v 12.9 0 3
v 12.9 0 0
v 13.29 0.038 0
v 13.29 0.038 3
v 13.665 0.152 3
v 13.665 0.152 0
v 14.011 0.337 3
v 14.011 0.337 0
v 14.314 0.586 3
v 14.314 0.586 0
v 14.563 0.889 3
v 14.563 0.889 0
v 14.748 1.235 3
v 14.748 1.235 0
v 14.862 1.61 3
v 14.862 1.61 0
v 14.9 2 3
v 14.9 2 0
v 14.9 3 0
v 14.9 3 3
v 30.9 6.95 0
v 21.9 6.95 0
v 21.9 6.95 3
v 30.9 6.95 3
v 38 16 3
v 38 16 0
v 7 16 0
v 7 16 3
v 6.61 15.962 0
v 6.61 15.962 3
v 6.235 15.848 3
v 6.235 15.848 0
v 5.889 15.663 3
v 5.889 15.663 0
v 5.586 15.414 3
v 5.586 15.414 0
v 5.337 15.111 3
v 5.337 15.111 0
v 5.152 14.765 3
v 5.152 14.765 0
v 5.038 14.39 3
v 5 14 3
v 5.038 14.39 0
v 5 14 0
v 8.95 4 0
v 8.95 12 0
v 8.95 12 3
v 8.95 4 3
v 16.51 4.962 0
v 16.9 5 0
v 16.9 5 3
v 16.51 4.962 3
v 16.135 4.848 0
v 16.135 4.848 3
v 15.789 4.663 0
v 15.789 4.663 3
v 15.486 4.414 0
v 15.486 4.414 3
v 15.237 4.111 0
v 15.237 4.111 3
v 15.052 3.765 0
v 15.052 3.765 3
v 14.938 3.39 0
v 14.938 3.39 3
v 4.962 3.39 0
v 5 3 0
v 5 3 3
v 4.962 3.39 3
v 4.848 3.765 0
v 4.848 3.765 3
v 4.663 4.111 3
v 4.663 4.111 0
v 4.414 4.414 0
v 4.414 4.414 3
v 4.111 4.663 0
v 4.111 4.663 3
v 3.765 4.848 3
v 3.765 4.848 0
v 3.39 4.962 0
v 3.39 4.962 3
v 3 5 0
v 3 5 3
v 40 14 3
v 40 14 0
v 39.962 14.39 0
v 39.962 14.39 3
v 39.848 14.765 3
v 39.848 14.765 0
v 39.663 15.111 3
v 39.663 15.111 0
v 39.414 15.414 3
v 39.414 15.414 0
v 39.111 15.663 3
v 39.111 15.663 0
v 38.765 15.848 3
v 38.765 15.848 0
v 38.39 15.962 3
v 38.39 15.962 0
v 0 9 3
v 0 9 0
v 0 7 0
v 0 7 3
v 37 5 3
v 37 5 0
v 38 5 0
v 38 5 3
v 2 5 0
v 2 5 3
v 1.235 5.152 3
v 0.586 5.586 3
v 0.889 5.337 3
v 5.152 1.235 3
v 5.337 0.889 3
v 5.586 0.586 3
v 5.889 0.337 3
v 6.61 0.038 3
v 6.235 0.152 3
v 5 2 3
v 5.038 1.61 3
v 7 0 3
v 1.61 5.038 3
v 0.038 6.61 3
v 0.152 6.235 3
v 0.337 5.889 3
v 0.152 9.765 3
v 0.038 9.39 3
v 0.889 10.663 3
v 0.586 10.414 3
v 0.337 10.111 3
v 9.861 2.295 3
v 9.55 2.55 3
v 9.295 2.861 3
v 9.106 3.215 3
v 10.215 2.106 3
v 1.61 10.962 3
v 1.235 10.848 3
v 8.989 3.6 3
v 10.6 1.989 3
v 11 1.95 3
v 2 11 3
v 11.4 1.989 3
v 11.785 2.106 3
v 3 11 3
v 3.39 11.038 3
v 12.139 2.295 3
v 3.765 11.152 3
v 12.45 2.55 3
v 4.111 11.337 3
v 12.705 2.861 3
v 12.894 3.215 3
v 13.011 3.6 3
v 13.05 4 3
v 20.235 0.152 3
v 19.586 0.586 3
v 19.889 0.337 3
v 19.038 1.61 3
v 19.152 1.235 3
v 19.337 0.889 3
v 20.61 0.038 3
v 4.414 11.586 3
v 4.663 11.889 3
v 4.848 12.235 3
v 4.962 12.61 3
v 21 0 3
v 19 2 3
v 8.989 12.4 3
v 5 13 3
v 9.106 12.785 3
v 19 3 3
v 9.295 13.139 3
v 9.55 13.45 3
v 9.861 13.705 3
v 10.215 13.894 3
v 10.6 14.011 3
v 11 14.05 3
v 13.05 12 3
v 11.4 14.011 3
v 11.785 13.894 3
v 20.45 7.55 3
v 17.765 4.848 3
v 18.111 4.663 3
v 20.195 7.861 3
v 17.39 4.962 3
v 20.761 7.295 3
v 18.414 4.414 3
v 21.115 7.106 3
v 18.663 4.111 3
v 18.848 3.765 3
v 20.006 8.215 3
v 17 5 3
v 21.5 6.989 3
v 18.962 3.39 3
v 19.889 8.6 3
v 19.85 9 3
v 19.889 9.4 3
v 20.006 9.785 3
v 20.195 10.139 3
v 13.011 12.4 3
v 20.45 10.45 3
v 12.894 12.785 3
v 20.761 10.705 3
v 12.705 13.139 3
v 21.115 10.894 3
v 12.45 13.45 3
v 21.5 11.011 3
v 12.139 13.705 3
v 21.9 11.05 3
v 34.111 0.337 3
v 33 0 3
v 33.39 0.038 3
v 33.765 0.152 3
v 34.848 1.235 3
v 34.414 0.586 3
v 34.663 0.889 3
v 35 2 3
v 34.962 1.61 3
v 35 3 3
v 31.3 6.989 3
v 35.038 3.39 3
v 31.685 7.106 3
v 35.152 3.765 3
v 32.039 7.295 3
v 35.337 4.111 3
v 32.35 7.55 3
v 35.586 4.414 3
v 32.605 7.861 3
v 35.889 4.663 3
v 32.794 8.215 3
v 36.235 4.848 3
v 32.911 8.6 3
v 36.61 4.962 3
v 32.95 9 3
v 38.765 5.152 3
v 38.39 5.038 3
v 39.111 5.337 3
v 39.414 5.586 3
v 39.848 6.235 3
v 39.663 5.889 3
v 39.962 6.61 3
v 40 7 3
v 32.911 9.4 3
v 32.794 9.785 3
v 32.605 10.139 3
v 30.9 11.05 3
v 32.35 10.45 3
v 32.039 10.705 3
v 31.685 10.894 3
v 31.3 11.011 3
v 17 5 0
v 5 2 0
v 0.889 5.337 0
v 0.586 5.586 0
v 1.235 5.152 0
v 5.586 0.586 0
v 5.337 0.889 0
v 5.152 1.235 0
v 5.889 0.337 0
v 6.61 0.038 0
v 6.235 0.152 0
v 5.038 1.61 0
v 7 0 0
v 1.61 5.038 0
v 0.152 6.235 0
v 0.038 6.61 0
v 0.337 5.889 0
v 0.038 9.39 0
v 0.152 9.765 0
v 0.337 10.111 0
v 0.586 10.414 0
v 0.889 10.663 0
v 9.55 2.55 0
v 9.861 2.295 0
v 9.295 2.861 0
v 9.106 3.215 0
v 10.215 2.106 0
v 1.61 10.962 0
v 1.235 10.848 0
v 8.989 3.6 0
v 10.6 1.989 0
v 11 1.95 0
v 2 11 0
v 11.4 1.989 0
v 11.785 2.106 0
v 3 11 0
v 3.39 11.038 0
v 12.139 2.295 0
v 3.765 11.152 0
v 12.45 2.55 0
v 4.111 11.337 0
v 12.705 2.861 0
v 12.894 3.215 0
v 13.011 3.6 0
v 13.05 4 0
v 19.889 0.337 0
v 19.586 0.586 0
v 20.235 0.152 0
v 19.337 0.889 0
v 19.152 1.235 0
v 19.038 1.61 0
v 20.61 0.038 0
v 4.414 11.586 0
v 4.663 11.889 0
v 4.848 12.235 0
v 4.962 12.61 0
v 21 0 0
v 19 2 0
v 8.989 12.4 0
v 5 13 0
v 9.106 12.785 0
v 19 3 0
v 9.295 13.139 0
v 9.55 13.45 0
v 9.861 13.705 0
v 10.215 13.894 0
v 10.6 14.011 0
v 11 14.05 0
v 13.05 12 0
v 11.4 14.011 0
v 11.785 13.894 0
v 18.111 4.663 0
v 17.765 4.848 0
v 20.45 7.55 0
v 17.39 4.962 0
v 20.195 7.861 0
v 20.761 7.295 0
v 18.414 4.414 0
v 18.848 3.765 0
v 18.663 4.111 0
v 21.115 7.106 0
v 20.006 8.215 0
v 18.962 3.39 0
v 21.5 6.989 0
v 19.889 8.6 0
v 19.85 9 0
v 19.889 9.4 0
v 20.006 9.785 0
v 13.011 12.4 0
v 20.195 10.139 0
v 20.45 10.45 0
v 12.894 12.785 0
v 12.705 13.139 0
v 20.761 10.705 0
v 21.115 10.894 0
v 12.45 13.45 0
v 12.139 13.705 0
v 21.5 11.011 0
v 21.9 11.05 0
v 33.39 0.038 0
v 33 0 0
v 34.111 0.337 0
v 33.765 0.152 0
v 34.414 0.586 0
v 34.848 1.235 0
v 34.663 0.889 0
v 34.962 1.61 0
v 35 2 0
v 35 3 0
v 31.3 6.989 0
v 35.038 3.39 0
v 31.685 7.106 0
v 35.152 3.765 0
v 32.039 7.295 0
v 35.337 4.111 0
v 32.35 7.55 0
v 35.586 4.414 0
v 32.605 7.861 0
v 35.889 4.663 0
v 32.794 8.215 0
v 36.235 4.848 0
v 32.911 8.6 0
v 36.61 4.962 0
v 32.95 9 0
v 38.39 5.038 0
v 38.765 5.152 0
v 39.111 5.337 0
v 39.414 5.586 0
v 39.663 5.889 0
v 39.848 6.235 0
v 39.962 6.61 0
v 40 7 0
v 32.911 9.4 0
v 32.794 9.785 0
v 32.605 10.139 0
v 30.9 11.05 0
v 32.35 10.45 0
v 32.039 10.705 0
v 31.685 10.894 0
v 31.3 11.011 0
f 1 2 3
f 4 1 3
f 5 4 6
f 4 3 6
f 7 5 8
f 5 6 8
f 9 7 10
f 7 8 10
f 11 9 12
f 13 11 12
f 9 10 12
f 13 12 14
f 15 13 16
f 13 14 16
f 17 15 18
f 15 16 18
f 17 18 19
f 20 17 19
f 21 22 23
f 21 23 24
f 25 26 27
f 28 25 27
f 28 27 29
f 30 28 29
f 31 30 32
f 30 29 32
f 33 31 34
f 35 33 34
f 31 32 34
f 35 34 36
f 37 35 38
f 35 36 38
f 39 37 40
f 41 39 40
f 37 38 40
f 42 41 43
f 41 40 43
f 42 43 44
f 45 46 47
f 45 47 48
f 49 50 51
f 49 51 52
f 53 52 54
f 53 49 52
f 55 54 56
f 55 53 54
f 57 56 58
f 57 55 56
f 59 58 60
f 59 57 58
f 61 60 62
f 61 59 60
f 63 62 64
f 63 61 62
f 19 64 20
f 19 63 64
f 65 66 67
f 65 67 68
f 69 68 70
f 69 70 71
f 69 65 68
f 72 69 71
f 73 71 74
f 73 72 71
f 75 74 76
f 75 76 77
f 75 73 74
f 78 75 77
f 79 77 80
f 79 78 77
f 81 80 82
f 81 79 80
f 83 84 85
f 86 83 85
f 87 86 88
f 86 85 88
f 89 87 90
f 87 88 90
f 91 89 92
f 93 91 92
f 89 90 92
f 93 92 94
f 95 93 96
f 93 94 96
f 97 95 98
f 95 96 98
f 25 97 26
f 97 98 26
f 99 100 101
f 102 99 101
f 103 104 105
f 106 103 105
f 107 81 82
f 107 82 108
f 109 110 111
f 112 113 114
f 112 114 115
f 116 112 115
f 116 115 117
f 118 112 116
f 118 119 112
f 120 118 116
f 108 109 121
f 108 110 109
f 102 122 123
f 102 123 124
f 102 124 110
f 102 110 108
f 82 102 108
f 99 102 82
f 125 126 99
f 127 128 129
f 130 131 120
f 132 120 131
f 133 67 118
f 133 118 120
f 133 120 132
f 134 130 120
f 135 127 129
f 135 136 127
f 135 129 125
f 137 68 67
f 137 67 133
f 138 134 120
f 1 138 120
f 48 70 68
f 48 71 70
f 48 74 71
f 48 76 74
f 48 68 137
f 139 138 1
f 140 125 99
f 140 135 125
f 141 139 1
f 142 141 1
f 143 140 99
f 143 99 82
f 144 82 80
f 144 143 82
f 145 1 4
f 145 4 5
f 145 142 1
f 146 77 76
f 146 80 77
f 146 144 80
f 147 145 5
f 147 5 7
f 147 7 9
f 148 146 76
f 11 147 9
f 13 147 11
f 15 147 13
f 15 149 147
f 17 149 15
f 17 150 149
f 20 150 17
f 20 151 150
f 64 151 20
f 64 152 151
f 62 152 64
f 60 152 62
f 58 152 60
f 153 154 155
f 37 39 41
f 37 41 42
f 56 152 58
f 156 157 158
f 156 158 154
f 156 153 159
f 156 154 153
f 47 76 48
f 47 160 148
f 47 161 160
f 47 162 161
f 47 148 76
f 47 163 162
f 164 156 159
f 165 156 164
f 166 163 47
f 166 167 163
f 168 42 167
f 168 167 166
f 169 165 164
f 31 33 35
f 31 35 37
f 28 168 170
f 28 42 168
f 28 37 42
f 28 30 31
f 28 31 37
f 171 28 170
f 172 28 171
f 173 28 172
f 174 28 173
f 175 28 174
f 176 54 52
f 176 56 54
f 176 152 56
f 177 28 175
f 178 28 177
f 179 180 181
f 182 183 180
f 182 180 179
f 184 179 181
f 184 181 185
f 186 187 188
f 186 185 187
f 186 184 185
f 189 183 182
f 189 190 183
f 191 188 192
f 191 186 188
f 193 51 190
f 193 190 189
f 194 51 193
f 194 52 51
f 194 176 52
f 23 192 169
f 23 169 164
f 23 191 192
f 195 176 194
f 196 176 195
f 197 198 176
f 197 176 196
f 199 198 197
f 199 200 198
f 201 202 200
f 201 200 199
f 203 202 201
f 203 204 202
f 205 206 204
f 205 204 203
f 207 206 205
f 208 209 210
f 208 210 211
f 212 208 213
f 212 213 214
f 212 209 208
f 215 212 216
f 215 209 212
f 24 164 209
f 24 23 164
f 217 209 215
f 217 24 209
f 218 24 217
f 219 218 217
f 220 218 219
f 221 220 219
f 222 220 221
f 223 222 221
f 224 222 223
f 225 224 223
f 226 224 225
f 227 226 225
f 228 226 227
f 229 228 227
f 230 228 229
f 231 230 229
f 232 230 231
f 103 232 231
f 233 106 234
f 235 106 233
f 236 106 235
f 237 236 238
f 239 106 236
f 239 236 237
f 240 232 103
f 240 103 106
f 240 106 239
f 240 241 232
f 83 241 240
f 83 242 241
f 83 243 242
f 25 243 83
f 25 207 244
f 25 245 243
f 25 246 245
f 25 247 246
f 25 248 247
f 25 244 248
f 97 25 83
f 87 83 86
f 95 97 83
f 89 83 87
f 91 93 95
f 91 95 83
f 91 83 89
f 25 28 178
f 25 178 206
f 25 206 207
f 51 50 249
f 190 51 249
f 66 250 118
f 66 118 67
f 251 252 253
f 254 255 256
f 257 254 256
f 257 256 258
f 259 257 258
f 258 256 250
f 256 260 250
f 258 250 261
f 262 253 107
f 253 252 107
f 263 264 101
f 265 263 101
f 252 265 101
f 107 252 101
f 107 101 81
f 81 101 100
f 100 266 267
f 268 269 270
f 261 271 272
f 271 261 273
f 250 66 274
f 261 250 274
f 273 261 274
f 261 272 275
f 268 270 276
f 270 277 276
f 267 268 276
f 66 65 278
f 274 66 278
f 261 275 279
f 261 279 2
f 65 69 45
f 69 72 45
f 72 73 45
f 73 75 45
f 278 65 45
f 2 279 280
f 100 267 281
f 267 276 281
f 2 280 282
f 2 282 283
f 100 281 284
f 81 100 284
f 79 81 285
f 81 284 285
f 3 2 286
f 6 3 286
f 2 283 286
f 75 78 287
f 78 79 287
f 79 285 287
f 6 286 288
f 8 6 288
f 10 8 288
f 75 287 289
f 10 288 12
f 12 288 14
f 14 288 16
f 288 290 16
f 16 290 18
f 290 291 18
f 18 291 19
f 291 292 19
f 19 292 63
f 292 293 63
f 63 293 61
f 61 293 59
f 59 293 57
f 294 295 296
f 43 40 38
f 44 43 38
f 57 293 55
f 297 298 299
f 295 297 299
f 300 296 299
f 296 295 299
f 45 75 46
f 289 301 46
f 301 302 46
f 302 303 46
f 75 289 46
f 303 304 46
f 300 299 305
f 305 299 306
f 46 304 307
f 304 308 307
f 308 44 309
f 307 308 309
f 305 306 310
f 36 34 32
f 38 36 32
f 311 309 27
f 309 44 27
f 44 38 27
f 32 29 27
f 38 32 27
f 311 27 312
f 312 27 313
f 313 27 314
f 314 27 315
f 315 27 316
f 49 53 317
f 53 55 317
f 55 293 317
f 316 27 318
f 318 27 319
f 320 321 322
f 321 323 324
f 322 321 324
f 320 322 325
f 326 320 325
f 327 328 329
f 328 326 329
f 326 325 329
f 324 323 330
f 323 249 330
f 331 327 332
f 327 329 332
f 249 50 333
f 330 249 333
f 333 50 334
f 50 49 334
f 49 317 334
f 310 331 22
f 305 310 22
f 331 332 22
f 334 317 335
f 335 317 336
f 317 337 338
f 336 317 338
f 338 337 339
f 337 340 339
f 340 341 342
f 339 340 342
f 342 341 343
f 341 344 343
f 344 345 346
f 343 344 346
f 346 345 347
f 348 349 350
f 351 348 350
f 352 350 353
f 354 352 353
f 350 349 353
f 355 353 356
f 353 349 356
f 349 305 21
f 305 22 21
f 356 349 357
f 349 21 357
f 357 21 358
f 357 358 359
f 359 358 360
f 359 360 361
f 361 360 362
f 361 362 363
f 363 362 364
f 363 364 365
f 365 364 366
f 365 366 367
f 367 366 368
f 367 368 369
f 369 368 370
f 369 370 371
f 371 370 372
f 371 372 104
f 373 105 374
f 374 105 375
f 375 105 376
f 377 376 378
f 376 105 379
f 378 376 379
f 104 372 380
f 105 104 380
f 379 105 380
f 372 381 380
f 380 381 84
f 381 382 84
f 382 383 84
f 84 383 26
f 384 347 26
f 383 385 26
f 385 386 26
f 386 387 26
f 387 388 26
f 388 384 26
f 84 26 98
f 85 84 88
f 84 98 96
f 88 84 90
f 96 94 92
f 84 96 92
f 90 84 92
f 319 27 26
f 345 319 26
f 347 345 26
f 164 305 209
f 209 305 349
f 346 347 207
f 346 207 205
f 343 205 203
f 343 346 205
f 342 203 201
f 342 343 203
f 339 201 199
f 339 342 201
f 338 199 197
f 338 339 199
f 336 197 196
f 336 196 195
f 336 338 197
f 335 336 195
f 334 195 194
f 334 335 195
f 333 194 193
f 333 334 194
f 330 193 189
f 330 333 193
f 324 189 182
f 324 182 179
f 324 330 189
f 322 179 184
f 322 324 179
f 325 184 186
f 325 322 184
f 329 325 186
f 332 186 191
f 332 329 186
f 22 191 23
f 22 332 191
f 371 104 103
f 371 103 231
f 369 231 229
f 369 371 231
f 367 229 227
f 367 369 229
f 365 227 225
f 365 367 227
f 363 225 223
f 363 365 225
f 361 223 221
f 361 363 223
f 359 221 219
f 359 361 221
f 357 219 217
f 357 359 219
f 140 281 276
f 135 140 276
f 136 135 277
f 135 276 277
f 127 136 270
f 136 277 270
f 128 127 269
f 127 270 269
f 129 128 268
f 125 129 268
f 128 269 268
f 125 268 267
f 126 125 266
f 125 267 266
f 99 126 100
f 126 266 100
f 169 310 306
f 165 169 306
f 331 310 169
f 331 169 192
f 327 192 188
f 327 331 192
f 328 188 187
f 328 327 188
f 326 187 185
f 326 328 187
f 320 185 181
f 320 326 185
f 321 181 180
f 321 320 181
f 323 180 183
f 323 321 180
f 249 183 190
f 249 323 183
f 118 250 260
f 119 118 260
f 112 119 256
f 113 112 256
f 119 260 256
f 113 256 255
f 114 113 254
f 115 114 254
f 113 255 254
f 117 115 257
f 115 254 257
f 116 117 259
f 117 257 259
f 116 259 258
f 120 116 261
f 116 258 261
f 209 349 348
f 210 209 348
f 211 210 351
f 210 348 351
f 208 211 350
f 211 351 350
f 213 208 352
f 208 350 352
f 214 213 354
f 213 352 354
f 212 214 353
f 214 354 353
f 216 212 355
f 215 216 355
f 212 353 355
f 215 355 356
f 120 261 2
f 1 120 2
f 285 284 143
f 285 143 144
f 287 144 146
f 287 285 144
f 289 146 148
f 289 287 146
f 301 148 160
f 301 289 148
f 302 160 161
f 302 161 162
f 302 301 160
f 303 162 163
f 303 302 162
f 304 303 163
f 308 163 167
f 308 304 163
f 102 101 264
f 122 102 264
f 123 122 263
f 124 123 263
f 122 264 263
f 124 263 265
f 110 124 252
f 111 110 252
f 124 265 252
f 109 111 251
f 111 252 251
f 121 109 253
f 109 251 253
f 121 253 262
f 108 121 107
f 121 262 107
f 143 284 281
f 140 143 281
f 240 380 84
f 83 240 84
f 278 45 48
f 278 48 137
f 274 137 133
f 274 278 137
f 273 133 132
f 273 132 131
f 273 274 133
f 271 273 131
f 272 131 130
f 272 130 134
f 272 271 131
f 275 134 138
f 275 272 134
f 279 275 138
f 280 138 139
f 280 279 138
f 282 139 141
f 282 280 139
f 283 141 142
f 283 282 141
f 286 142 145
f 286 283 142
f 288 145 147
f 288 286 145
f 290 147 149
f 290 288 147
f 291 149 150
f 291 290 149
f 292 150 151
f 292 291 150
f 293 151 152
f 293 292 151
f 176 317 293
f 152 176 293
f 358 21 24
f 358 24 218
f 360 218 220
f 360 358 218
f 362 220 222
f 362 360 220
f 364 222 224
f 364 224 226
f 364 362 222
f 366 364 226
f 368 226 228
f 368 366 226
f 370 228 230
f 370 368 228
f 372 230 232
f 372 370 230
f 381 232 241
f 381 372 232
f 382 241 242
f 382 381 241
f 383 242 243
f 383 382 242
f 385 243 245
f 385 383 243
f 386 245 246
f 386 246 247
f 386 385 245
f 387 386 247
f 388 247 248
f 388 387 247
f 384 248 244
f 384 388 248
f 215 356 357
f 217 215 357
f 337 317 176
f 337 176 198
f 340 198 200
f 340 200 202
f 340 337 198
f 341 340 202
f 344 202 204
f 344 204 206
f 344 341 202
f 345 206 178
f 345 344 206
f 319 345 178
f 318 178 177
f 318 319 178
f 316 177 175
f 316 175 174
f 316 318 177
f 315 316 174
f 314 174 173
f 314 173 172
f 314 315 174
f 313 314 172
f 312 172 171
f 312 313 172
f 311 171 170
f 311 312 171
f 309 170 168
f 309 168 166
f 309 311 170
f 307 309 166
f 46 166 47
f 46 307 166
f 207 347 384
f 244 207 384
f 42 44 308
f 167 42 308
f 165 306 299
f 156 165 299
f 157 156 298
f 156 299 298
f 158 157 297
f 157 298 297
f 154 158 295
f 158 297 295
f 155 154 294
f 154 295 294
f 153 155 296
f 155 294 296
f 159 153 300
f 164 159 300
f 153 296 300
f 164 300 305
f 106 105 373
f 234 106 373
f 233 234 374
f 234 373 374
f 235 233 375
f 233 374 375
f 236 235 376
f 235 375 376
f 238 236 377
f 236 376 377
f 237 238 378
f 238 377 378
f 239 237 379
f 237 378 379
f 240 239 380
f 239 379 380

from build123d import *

# Parameters (mm, degrees)
PAD_DEPTH = 3


with BuildPart() as part:
    # Sketch → Pad (new body)
    with BuildSketch(Plane.XY):
        with BuildLine():
            Line((7, 0), (12.9, 0))
            ThreePointArc((12.9, 0), (14.314214, 0.585786), (14.9, 2))
            Line((14.9, 2), (14.9, 3))
            ThreePointArc((16.9, 5), (15.485786, 4.414214), (14.9, 3))
            Line((16.9, 5), (17, 5))
            ThreePointArc((19, 3), (18.414214, 4.414214), (17, 5))
            Line((19, 3), (19, 2))
            ThreePointArc((19, 2), (19.585786, 0.585786), (21, 0))
            Line((21, 0), (33, 0))
            ThreePointArc((33, 0), (34.414214, 0.585786), (35, 2))
            Line((35, 2), (35, 3))
            ThreePointArc((37, 5), (35.585786, 4.414214), (35, 3))
            Line((37, 5), (38, 5))
            ThreePointArc((38, 5), (39.414214, 5.585786), (40, 7))
            Line((40, 7), (40, 14))
            ThreePointArc((40, 14), (39.414214, 15.414214), (38, 16))
            Line((38, 16), (7, 16))
            ThreePointArc((7, 16), (5.585786, 15.414214), (5, 14))
            Line((5, 14), (5, 13))
            ThreePointArc((3, 11), (4.414214, 11.585786), (5, 13))
            Line((3, 11), (2, 11))
            ThreePointArc((2, 11), (0.585786, 10.414214), (0, 9))
            Line((0, 9), (0, 7))
            ThreePointArc((0, 7), (0.585786, 5.585786), (2, 5))
            Line((3, 5), (2, 5))
            ThreePointArc((5, 3), (4.414214, 4.414214), (3, 5))
            Line((5, 2), (5, 3))
            ThreePointArc((5, 2), (5.585786, 0.585786), (7, 0))
        make_face()
        with BuildLine():
            ThreePointArc((21.9, 11.05), (19.85, 9), (21.9, 6.95))
            Line((21.9, 6.95), (30.9, 6.95))
            ThreePointArc((30.9, 6.95), (32.95, 9), (30.9, 11.05))
            Line((21.9, 11.05), (30.9, 11.05))
        make_face(mode=Mode.SUBTRACT)
        with BuildLine():
            ThreePointArc((13.05, 12), (11, 14.05), (8.95, 12))
            Line((8.95, 12), (8.95, 4))
            ThreePointArc((8.95, 4), (11, 1.95), (13.05, 4))
            Line((13.05, 12), (13.05, 4))
        make_face(mode=Mode.SUBTRACT)
    extrude(amount=PAD_DEPTH)


solid = part.part
